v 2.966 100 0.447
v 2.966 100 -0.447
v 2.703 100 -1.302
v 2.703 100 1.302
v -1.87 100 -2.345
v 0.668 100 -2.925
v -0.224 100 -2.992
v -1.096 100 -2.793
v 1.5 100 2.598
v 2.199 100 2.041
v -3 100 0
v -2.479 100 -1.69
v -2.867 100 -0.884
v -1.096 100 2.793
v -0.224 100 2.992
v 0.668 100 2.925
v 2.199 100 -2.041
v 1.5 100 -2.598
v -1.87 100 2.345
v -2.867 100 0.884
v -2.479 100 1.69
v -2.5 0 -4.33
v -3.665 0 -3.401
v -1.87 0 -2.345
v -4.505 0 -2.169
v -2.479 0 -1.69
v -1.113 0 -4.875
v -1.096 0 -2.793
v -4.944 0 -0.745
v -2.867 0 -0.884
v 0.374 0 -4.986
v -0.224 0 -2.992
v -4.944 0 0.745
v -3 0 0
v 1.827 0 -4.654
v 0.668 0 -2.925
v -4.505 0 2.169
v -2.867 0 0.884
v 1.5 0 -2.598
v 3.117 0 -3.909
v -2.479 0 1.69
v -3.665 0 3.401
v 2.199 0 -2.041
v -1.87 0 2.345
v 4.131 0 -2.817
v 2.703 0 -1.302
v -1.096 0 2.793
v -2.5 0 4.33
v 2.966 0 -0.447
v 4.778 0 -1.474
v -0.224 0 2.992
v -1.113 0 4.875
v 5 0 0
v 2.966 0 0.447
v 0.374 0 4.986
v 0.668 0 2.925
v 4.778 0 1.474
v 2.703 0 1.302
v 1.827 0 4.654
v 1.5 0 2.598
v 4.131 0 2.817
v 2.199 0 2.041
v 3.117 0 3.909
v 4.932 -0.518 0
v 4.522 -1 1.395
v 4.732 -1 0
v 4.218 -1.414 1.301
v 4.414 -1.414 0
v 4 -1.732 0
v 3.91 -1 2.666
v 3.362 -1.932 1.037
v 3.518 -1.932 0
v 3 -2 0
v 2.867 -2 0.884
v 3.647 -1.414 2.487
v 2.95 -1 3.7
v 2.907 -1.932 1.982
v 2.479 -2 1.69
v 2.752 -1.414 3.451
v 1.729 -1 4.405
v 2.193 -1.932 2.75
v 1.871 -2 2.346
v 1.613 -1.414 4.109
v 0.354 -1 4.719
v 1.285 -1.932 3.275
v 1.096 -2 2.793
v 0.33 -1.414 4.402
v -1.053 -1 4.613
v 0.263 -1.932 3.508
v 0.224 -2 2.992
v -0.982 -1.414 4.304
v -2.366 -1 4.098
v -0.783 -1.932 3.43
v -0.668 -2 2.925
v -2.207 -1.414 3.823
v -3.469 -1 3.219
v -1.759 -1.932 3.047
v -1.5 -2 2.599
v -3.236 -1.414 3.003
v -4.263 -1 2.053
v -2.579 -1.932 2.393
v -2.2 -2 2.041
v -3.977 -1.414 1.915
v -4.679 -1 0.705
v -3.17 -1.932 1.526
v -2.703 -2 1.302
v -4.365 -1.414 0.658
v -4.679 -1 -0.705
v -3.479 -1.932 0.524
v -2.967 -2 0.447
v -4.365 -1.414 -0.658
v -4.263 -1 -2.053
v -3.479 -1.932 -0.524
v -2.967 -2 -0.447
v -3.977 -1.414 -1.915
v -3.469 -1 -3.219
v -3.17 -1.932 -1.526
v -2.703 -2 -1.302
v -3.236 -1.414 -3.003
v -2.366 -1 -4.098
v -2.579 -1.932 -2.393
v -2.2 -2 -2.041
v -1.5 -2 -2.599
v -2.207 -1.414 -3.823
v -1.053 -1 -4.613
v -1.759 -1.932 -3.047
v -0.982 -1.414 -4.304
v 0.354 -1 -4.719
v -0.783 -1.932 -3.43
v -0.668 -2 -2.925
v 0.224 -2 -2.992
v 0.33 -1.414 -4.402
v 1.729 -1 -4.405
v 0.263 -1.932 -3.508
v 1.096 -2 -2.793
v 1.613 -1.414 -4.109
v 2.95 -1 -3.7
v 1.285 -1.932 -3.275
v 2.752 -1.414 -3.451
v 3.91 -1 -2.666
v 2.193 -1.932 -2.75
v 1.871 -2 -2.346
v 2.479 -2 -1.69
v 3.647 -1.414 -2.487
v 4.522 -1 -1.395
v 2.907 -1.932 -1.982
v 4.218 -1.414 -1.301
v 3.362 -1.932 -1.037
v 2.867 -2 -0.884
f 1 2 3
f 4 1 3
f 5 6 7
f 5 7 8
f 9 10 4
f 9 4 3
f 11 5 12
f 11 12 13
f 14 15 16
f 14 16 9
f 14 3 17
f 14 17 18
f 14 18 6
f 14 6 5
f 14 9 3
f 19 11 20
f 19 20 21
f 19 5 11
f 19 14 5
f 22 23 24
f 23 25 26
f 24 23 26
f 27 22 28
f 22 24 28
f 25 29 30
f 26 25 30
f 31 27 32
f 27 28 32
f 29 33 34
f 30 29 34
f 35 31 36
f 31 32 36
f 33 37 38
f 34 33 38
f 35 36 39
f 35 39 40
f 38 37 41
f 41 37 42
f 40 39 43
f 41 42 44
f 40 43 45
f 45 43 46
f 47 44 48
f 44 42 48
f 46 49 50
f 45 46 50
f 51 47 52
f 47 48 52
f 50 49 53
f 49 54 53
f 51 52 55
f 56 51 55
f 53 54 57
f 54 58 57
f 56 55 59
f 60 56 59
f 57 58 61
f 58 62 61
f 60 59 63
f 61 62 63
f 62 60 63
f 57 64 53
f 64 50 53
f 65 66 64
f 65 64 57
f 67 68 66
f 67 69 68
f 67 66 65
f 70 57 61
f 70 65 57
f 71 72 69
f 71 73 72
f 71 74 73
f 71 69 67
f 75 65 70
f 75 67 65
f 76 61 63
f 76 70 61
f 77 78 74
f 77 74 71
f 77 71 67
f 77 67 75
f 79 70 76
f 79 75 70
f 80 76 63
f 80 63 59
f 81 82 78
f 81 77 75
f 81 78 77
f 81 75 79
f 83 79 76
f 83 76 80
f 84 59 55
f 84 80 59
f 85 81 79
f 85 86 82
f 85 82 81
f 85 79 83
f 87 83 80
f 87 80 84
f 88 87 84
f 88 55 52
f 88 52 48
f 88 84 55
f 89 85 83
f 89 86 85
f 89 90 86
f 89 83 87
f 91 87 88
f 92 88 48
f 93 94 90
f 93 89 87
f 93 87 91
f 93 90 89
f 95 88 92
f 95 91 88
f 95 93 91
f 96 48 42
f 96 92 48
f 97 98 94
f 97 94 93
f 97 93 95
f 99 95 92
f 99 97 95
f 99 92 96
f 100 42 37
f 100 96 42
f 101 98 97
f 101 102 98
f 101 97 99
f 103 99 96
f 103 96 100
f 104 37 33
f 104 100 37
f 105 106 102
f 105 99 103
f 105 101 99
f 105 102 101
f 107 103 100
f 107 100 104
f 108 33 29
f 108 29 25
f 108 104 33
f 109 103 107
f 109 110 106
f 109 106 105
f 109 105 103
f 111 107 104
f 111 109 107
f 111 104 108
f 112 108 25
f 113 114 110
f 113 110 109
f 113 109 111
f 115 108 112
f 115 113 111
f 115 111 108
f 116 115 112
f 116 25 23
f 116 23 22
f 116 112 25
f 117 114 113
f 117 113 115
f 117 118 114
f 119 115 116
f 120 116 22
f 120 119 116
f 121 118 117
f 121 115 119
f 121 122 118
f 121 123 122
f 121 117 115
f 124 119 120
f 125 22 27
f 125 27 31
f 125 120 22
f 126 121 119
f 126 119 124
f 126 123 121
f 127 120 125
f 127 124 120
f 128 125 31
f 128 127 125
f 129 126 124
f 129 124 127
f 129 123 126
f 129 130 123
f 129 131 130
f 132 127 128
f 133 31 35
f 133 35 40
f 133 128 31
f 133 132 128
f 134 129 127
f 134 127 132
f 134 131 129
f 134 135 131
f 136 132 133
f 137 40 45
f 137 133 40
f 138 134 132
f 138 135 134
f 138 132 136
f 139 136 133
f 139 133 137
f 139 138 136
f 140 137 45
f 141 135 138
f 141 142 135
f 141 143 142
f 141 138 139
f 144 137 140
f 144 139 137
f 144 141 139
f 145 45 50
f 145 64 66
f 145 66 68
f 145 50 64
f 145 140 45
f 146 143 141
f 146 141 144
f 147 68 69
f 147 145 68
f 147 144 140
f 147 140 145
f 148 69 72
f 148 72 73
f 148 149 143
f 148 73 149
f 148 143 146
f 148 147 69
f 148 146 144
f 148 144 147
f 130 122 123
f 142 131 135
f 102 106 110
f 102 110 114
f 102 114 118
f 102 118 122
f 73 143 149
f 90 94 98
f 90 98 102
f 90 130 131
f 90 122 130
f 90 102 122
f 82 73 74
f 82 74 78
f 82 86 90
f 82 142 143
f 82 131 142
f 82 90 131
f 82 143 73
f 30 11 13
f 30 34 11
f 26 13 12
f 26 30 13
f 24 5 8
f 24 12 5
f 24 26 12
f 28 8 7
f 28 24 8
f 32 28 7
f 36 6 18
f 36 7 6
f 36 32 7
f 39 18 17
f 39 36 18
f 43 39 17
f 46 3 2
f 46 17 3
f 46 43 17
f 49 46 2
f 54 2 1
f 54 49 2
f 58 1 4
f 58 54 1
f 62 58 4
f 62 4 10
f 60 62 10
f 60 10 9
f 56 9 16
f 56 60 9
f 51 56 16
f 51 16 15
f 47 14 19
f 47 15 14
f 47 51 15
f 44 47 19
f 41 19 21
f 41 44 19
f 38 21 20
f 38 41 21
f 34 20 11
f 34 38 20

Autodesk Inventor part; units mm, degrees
ref_plane "YZ Plane" through (0, 0, 0) normal (1, 0, 0) x (0, 1, 0)
ref_plane "XZ Plane" through (0, 0, 0) normal (0, 1, 0) x (-1, 0, 0)
ref_plane "XY Plane" through (0, 0, 0) normal (0, 0, 1) x (1, 0, 0)
sketch "Esquisse1" plane through (0, 0, 0) normal (0, 1, 0) x (-1, 0, 0)
  circle A0 centre (0, 0) radius 3
  dimension "d0" = 6
extrude "Extrusion1" add sketch "Esquisse1" along normal blind 100
sketch "Esquisse2" plane through (0, 0, 0) normal (0, -1, 0) x (1, 0, 0)
  circle A0 centre (0, 0) radius 3 projected
  circle A1 centre (0, 0) radius 5
  dimension "d3" = 10
extrude "Extrusion2" add sketch "Esquisse2" along normal blind 2 contours A0 | A1
fillet "Congé1" radius 2 1 edges at (-5, -2, 0)
properties part number "vis_6mm_100mm"
